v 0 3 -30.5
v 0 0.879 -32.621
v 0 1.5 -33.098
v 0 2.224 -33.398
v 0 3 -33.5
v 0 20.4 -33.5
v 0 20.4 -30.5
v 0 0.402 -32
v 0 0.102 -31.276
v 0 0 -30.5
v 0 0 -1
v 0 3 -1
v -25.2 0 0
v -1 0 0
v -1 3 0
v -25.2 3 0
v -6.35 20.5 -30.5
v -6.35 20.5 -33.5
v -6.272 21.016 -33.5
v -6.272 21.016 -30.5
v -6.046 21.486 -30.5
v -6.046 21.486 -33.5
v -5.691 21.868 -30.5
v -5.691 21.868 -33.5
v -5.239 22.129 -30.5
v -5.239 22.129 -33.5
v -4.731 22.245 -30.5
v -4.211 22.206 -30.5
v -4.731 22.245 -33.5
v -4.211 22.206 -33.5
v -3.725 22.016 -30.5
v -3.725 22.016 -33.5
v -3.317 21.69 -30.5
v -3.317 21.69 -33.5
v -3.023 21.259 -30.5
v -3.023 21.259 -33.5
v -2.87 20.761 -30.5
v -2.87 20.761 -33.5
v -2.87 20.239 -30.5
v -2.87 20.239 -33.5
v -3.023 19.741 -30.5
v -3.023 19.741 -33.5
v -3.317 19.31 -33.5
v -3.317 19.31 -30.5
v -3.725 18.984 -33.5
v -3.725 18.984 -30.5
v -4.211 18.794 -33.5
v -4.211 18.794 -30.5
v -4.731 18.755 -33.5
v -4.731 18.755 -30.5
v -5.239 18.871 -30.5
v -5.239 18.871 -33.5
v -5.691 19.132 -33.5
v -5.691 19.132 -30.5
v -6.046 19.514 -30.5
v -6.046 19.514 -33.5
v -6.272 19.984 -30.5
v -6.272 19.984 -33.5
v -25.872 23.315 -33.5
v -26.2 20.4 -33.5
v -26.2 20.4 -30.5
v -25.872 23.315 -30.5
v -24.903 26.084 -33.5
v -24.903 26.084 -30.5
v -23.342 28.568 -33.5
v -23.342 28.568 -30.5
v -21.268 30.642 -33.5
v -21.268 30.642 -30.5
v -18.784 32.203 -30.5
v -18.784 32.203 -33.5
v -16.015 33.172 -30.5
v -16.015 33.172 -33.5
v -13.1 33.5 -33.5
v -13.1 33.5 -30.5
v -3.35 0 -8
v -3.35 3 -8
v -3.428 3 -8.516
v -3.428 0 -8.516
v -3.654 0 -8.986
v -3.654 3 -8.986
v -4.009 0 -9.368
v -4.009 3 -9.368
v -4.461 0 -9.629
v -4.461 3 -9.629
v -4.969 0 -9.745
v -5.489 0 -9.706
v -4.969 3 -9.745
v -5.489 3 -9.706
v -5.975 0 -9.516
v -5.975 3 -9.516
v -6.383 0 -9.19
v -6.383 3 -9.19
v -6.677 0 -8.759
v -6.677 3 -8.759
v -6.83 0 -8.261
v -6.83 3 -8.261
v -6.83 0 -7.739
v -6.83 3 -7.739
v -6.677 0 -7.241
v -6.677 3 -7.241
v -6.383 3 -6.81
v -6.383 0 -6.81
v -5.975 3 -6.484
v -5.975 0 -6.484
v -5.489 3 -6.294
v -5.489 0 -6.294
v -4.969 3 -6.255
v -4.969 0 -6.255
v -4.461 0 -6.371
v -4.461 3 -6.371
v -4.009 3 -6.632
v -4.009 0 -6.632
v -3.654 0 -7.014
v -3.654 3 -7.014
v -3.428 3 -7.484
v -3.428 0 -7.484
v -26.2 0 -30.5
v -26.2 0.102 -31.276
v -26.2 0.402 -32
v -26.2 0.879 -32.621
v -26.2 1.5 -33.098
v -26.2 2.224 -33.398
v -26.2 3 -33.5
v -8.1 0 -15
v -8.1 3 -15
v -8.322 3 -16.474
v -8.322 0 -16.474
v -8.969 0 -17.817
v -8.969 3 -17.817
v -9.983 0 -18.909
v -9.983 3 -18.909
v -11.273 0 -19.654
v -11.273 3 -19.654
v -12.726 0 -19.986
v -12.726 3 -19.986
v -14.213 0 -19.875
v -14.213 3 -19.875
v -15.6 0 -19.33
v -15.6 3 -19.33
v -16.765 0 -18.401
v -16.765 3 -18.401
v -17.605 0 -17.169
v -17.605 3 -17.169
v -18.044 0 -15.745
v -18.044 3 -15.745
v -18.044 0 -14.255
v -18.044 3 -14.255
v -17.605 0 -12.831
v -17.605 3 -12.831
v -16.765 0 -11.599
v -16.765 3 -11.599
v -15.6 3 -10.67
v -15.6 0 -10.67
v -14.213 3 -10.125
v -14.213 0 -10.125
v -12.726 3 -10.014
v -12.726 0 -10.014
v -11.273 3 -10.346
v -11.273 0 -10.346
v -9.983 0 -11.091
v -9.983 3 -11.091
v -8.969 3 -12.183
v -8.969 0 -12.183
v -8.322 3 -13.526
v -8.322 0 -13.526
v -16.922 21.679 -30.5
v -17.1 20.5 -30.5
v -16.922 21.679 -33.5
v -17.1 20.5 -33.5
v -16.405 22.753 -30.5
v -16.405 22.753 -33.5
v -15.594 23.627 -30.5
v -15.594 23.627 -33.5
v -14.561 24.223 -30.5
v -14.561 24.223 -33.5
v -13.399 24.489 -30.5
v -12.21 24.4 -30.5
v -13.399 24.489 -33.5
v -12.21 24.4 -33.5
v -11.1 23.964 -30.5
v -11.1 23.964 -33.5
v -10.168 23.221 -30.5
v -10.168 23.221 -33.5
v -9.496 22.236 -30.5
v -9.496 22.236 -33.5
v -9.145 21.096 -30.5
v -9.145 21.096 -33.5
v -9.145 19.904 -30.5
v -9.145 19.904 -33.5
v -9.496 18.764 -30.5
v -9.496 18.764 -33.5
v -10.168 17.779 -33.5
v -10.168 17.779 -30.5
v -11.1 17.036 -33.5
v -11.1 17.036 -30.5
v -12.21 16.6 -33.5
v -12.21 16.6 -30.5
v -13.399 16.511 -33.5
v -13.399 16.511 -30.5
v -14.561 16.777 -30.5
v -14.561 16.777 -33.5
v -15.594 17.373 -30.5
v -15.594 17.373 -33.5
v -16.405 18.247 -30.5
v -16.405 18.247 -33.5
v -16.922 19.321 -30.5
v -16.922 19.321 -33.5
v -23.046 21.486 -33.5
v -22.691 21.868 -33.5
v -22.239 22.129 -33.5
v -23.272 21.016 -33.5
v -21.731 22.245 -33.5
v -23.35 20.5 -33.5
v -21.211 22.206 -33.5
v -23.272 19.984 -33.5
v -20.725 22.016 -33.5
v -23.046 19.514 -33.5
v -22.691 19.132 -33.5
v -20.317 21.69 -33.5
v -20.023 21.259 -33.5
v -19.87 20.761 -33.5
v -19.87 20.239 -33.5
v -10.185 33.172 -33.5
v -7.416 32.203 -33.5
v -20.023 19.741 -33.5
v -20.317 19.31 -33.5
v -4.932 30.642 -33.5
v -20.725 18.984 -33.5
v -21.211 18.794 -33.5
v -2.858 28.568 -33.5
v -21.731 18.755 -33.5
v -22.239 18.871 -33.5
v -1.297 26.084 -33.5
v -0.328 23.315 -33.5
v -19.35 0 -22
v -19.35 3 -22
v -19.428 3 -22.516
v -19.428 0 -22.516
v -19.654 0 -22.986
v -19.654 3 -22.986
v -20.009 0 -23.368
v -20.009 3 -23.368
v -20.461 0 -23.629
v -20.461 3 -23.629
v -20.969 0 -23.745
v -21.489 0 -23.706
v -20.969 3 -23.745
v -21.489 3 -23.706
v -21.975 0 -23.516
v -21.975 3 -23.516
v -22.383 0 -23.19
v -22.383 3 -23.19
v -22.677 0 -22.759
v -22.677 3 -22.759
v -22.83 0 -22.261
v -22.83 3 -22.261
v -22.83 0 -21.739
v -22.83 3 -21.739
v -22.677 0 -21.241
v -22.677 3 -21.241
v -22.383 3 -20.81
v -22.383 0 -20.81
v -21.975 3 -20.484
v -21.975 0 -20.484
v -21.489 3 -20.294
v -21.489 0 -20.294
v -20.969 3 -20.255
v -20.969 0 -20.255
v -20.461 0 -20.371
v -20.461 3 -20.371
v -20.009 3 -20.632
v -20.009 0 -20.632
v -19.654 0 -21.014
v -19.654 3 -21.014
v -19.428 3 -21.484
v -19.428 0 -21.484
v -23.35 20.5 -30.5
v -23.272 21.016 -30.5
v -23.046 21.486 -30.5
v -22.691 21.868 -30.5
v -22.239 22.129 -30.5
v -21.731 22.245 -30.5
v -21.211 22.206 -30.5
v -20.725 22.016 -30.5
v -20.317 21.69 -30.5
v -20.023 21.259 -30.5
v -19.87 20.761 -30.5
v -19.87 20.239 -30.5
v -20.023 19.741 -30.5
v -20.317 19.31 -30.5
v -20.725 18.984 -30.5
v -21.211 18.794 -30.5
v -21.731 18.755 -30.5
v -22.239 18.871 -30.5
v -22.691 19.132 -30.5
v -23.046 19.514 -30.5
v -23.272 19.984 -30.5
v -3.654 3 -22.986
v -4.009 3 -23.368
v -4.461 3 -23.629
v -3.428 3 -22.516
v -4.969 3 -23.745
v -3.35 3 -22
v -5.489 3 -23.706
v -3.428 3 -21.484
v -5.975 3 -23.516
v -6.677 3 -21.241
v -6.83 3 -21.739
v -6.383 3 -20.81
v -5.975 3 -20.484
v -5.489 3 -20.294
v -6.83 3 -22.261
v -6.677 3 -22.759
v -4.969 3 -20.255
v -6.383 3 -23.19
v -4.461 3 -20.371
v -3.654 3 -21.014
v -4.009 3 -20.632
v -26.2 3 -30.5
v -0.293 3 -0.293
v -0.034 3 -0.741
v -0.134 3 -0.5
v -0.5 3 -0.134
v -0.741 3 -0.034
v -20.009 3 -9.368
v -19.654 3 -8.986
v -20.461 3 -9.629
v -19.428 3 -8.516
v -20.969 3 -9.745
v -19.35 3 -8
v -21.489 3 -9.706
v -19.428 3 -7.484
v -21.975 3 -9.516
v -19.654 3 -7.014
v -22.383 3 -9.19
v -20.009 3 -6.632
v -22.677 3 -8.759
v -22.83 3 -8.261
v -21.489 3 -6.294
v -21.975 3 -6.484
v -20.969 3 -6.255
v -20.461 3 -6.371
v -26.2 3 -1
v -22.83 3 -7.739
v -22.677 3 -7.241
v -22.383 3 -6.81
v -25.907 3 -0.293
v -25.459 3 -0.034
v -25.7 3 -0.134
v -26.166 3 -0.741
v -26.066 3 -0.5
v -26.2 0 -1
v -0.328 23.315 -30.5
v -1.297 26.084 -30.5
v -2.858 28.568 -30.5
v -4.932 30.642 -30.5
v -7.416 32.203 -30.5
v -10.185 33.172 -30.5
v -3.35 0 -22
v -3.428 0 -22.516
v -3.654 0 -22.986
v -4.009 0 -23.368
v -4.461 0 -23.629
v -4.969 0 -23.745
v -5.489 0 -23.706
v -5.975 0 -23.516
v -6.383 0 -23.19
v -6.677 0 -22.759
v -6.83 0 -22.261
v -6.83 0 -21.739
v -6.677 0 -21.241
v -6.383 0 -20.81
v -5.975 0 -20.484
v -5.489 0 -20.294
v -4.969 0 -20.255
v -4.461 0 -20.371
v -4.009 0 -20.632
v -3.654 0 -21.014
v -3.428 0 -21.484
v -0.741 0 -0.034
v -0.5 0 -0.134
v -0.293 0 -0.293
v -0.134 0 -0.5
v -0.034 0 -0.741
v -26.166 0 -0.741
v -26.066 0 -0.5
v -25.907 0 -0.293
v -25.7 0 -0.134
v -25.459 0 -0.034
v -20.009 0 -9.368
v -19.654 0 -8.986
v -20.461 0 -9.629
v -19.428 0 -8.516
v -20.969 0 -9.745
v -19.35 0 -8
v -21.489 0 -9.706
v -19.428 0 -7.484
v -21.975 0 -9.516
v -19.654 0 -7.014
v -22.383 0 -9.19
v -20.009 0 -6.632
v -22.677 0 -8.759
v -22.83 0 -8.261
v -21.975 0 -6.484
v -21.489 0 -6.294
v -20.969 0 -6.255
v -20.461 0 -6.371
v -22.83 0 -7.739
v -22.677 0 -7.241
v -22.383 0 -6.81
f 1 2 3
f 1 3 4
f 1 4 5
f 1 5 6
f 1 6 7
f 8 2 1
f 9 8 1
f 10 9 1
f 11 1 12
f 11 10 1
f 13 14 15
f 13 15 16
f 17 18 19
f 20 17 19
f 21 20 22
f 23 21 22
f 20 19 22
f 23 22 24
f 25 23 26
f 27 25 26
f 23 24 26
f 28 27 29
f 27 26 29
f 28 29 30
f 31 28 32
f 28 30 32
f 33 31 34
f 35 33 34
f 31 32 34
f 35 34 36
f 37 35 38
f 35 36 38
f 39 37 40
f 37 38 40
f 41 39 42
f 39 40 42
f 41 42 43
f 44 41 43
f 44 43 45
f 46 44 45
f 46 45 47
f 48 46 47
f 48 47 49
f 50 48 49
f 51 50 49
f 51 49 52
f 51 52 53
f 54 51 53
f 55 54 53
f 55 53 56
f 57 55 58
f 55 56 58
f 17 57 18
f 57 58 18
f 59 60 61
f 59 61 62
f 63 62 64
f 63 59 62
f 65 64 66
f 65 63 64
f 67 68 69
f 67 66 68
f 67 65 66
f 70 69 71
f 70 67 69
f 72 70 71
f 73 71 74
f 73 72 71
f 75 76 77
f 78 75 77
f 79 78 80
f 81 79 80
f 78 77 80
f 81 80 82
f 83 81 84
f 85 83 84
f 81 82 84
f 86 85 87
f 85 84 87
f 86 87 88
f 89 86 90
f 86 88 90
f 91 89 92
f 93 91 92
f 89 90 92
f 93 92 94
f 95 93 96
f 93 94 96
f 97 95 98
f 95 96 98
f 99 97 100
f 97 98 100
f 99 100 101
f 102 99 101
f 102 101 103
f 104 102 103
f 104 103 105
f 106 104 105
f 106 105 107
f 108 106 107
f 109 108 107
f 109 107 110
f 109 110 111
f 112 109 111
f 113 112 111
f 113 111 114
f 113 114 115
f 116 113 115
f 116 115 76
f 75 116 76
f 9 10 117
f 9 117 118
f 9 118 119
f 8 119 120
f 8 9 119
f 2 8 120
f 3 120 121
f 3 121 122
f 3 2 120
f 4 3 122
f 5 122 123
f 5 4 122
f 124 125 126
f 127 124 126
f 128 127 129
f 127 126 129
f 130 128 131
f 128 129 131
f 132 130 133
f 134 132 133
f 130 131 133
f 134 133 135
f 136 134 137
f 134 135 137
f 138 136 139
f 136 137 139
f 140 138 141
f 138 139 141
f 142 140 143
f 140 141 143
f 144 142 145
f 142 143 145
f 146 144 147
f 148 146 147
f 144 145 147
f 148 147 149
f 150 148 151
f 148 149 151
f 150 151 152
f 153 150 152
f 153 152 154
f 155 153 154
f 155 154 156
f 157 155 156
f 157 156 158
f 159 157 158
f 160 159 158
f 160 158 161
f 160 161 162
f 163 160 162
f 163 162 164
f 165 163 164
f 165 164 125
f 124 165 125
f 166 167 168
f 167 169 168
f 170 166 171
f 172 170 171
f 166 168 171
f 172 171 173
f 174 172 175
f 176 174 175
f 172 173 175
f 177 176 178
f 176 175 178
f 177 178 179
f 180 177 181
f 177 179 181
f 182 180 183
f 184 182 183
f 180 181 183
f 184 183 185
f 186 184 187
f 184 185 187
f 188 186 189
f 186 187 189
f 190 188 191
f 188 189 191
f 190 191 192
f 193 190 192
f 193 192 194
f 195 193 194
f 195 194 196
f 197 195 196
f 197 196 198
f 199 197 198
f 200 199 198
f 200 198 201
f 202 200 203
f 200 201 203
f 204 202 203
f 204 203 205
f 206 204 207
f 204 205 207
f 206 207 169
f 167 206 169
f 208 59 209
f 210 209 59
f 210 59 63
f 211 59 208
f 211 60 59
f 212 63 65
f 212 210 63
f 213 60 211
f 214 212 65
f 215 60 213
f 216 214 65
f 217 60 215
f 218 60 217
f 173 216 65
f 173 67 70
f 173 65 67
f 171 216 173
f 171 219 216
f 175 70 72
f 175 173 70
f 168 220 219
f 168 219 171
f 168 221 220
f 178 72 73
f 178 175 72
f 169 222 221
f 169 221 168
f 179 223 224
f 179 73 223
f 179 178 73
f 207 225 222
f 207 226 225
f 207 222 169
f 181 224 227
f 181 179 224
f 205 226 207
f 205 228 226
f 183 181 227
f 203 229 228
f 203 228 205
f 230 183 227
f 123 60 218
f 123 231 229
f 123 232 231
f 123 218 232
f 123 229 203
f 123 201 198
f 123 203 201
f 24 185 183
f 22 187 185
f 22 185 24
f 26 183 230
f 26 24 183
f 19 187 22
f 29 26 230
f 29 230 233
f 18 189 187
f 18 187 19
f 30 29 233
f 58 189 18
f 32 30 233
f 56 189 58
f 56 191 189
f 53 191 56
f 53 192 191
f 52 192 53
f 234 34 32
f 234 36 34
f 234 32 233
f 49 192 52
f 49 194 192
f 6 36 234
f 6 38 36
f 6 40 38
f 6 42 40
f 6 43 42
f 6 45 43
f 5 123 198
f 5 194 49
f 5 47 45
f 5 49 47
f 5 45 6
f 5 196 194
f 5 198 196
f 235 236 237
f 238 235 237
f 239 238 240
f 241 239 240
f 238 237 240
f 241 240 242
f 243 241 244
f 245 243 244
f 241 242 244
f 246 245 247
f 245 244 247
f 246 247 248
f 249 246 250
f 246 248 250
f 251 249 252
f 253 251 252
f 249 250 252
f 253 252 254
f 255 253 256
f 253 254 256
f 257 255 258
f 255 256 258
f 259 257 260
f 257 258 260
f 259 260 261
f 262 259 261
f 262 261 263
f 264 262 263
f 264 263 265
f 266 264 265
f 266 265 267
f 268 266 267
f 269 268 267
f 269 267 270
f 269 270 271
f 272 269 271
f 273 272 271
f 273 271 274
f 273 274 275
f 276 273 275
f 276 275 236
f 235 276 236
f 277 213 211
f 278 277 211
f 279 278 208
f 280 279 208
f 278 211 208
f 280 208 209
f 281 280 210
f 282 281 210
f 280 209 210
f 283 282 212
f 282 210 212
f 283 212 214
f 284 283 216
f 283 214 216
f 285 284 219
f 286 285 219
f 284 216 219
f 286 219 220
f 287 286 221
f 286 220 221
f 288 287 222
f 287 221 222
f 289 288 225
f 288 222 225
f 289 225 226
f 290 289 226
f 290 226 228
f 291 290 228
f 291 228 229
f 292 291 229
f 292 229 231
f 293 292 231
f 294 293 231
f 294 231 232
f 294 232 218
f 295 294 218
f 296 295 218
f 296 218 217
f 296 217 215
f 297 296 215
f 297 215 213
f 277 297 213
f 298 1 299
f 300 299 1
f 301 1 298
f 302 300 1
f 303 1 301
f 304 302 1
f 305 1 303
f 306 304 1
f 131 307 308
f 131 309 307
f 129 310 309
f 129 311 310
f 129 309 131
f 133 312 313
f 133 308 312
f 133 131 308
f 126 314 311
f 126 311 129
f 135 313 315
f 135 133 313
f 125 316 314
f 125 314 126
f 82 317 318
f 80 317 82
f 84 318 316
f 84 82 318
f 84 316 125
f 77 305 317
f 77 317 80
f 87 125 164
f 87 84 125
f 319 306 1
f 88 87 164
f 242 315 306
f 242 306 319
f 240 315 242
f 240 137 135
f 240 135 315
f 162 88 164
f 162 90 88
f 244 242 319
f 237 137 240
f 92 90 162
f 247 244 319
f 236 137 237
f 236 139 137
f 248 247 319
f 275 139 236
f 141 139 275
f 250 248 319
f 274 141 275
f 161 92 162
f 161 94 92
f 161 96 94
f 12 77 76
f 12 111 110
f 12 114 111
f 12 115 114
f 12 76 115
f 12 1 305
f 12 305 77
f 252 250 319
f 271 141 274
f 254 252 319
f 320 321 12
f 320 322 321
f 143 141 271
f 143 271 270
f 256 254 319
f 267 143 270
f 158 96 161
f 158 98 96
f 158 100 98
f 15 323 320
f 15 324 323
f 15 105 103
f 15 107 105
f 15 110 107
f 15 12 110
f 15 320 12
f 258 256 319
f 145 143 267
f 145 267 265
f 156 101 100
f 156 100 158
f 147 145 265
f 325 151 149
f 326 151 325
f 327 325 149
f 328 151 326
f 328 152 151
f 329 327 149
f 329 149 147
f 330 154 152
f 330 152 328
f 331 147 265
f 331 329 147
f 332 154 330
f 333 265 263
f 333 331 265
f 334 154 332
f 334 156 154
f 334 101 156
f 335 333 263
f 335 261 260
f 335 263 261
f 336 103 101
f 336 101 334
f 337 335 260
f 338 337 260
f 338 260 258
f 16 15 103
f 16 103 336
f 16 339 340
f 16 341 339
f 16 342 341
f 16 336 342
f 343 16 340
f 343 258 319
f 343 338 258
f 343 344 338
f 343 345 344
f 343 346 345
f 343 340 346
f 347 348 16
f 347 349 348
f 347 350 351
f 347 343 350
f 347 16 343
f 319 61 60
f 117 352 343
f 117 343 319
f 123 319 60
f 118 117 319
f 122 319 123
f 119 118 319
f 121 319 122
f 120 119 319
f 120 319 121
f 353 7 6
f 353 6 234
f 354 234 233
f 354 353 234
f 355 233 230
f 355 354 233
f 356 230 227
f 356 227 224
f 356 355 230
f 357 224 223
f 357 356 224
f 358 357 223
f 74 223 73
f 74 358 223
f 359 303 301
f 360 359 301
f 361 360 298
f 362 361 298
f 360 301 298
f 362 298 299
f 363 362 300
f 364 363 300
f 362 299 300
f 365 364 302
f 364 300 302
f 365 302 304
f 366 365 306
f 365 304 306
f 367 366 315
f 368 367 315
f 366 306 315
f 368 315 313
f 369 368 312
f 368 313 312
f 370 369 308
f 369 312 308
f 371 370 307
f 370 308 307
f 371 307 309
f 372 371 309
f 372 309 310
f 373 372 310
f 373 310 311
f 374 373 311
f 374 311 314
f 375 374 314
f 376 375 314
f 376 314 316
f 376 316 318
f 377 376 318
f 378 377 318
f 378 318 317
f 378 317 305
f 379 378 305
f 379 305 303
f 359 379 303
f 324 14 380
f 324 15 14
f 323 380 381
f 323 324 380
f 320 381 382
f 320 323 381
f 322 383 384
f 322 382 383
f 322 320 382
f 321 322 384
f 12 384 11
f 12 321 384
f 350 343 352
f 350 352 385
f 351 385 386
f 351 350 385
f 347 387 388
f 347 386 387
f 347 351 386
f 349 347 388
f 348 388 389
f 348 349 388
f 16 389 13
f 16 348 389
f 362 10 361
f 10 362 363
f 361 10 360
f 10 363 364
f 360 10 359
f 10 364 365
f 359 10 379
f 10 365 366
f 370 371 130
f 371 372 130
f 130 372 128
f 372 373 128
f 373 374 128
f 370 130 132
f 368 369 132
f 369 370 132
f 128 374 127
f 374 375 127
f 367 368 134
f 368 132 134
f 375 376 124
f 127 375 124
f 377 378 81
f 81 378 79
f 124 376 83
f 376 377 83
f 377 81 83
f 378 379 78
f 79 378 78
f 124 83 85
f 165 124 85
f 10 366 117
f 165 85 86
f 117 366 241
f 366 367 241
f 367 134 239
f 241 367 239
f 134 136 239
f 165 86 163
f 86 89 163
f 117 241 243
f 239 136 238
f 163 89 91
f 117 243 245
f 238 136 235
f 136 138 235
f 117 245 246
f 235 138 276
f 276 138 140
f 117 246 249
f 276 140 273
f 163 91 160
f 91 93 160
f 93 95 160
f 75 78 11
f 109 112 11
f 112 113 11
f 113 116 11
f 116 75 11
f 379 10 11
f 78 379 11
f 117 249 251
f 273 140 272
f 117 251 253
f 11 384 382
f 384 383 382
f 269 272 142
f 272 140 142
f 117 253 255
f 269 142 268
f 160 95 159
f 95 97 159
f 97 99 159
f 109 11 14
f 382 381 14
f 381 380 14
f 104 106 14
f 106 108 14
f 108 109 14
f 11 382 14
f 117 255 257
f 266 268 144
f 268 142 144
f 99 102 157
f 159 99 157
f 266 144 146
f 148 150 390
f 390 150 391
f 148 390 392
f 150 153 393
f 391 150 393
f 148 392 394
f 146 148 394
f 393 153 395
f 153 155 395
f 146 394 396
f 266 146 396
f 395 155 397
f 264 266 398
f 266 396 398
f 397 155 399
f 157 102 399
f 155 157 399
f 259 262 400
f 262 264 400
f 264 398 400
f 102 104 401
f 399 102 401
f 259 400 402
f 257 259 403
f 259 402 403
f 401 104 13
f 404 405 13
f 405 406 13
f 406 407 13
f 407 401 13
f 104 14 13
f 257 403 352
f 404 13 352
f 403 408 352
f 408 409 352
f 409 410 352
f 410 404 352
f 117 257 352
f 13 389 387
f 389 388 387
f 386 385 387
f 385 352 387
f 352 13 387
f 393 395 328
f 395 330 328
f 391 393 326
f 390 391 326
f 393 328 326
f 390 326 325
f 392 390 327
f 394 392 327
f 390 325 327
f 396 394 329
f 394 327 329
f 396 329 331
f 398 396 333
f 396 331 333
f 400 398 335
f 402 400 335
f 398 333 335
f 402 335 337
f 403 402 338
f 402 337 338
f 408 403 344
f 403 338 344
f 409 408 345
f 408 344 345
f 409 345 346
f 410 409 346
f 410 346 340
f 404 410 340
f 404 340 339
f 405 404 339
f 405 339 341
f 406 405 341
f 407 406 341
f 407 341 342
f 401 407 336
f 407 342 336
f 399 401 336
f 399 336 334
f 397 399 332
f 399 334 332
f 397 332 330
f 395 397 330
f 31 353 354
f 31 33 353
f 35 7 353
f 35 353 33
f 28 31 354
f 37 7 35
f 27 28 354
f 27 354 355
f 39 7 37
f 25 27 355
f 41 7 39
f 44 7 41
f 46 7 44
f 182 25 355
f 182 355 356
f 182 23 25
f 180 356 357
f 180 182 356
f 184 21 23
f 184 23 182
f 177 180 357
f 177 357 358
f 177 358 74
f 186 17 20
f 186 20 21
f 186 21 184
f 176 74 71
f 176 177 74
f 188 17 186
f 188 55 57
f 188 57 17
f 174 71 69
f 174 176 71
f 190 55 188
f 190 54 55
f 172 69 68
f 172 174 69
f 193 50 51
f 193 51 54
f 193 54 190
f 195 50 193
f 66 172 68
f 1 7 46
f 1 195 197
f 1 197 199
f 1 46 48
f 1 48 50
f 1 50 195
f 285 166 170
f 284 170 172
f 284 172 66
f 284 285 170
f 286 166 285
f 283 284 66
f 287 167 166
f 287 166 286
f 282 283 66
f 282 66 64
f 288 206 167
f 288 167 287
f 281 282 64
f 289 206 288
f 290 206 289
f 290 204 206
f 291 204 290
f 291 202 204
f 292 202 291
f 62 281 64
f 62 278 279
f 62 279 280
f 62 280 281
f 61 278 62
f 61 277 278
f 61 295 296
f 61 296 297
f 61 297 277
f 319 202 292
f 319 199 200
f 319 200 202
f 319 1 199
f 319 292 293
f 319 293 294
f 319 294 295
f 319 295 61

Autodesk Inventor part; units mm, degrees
ref_plane "YZ Plane" through (0, 0, 0) normal (1, 0, 0) x (0, 1, 0)
ref_plane "XZ Plane" through (0, 0, 0) normal (0, 1, 0) x (-1, 0, 0)
ref_plane "XY Plane" through (0, 0, 0) normal (0, 0, 1) x (1, 0, 0)
sketch "Sketch1" plane through (0, 0, 0) normal (0, 1, 0) x (-1, 0, 0)
  line L0 (0, 0) -> (26.2, 0)
  line L1 (26.2, 0) -> (26.2, -33.5)
  line L2 (26.2, -33.5) -> (0, -33.5)
  line L3 (0, -33.5) -> (0, 0)
  dimension "d0" = 26.2
  dimension "d1" = 33.5
extrude "Extrusion1" add sketch "Sketch1" along normal blind 3
sketch "Sketch2" plane through (0, 3, 0) normal (0, 1, 0) x (1, 0, 0)
  line L0 (0, 33.5) -> (-26.2, 33.5) projected
  line L1 (-26.2, 33.5) -> (0, 33.5)
  line L2 (0, 33.5) -> (0, 30.5)
  line L3 (0, 30.5) -> (-26.2, 30.5)
  line L4 (-26.2, 30.5) -> (-26.2, 33.5)
  point P0 (0, 0)
  dimension "d4" = 26.2
  dimension "d5" = 3
extrude "Extrusion2" add sketch "Sketch2" along normal blind 30.5
fillet "Fillet1" radius 3 1 edges at (-13.1, 0, -33.5)
fillet "Fillet2" radius 13.1 2 edges at (0, 33.5, -32) (-26.2, 33.5, -32)
fillet "Fillet3" radius 1 2 edges at (-26.2, 1.5, 0) (0, 1.5, 0)
sketch "Sketch3" plane through (0, 3, 0) normal (0, 1, 0) x (1, 0, 0)
  circle A0 centre (-13.1, 15) radius 5
  line L0 (0, 1) -> (0, 30.5) projected
  line L1 (-25.2, 0) -> (-1, 0) projected
  circle A1 centre (-21.1, 8) radius 1.75
  line L2 (-26.2, 30.5) -> (-26.2, 1) projected
  circle A2 centre (-5.1, 8) radius 1.75
  circle A3 centre (-21.1, 22) radius 1.75
  circle A4 centre (-5.1, 22) radius 1.75
  point P0 (0, 0)
  dimension "d11" = 10
  dimension "d12" = 13.1
  dimension "d13" = 15
  dimension "d14" = 3.5
  dimension "d15" = 7
  dimension "d16" = 5.1
  dimension "d19" = 16
  dimension "d22" = 14
extrude "Extrusion3" cut sketch "Sketch3" against normal through all
sketch "Sketch4" plane through (0, 3, -33.5) normal (0, 0, -1) x (-1, 0, 0)
  circle A0 centre (13.1, 17.5) radius 4
  arc A1 (26.2, 17.4) -> (0, 17.4) centre (13.1, 17.4) ccw projected
  line L0 (0, 0) -> (0, 17.4) projected
  circle A2 centre (4.6, 17.5) radius 1.75
  circle A3 centre (21.6, 17.5) radius 1.75
  point P0 (0, -3)
  point P1 (13.1, 30.5)
  dimension "d27" = 8
  dimension "d28" = 13
  dimension "d32" = 13.1
  dimension "d33" = 3.5
  dimension "d34" = 4.6
  dimension "d35" = 3.5
  dimension "d36" = 17
extrude "Extrusion4" cut sketch "Sketch4" against normal through all
properties part number "suporte"
